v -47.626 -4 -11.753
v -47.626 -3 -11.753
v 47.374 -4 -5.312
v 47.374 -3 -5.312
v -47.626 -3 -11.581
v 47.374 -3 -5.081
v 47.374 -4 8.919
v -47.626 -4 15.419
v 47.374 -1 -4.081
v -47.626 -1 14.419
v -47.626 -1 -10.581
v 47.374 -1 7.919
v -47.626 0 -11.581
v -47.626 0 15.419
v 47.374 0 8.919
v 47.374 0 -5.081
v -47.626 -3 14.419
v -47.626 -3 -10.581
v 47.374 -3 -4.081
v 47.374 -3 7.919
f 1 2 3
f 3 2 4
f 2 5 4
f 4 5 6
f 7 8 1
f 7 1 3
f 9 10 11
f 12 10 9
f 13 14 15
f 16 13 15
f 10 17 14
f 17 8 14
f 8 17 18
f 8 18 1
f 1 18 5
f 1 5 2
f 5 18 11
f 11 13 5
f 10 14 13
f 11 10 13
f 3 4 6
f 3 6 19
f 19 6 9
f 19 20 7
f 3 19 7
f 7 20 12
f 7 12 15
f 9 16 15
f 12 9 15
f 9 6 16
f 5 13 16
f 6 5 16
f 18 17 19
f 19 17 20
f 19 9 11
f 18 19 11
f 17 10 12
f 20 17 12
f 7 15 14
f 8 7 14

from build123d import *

# Parameters (mm, degrees)
F1_DEPTH = 1
F3_DEPTH = 2
F5_DEPTH = 1


with BuildPart() as f1:
    # F0 (on Front) → F1 (new body)
    with BuildSketch(Plane.XZ):
        Polygon((47.37426, 8.919068), (-47.62574, 15.419068), (-47.62574, -11.580932), (47.37426, -5.080932), align=None)
    extrude(amount=F1_DEPTH)

    # F2 (on face) → F3 (join)
    with BuildSketch(Plane.XZ.offset(1)):
        Polygon((47.37426, 8.919068), (-47.62574, 15.419068), (-47.62574, 14.419068), (47.37426, 7.919068), align=None)
        Polygon((-47.62574, -10.580932), (-47.62574, -11.580932), (47.37426, -5.080932), (47.37426, -4.080932), align=None)
    extrude(amount=F3_DEPTH)

    # F4 (on face) → F5 (join)
    with BuildSketch(Plane.XZ.offset(3)):
        Polygon((47.37426, 8.919068), (-47.62574, 15.419068), (-47.62574, -11.753376), (47.37426, -5.31239), align=None)
    extrude(amount=F5_DEPTH)


solid = f1.part
